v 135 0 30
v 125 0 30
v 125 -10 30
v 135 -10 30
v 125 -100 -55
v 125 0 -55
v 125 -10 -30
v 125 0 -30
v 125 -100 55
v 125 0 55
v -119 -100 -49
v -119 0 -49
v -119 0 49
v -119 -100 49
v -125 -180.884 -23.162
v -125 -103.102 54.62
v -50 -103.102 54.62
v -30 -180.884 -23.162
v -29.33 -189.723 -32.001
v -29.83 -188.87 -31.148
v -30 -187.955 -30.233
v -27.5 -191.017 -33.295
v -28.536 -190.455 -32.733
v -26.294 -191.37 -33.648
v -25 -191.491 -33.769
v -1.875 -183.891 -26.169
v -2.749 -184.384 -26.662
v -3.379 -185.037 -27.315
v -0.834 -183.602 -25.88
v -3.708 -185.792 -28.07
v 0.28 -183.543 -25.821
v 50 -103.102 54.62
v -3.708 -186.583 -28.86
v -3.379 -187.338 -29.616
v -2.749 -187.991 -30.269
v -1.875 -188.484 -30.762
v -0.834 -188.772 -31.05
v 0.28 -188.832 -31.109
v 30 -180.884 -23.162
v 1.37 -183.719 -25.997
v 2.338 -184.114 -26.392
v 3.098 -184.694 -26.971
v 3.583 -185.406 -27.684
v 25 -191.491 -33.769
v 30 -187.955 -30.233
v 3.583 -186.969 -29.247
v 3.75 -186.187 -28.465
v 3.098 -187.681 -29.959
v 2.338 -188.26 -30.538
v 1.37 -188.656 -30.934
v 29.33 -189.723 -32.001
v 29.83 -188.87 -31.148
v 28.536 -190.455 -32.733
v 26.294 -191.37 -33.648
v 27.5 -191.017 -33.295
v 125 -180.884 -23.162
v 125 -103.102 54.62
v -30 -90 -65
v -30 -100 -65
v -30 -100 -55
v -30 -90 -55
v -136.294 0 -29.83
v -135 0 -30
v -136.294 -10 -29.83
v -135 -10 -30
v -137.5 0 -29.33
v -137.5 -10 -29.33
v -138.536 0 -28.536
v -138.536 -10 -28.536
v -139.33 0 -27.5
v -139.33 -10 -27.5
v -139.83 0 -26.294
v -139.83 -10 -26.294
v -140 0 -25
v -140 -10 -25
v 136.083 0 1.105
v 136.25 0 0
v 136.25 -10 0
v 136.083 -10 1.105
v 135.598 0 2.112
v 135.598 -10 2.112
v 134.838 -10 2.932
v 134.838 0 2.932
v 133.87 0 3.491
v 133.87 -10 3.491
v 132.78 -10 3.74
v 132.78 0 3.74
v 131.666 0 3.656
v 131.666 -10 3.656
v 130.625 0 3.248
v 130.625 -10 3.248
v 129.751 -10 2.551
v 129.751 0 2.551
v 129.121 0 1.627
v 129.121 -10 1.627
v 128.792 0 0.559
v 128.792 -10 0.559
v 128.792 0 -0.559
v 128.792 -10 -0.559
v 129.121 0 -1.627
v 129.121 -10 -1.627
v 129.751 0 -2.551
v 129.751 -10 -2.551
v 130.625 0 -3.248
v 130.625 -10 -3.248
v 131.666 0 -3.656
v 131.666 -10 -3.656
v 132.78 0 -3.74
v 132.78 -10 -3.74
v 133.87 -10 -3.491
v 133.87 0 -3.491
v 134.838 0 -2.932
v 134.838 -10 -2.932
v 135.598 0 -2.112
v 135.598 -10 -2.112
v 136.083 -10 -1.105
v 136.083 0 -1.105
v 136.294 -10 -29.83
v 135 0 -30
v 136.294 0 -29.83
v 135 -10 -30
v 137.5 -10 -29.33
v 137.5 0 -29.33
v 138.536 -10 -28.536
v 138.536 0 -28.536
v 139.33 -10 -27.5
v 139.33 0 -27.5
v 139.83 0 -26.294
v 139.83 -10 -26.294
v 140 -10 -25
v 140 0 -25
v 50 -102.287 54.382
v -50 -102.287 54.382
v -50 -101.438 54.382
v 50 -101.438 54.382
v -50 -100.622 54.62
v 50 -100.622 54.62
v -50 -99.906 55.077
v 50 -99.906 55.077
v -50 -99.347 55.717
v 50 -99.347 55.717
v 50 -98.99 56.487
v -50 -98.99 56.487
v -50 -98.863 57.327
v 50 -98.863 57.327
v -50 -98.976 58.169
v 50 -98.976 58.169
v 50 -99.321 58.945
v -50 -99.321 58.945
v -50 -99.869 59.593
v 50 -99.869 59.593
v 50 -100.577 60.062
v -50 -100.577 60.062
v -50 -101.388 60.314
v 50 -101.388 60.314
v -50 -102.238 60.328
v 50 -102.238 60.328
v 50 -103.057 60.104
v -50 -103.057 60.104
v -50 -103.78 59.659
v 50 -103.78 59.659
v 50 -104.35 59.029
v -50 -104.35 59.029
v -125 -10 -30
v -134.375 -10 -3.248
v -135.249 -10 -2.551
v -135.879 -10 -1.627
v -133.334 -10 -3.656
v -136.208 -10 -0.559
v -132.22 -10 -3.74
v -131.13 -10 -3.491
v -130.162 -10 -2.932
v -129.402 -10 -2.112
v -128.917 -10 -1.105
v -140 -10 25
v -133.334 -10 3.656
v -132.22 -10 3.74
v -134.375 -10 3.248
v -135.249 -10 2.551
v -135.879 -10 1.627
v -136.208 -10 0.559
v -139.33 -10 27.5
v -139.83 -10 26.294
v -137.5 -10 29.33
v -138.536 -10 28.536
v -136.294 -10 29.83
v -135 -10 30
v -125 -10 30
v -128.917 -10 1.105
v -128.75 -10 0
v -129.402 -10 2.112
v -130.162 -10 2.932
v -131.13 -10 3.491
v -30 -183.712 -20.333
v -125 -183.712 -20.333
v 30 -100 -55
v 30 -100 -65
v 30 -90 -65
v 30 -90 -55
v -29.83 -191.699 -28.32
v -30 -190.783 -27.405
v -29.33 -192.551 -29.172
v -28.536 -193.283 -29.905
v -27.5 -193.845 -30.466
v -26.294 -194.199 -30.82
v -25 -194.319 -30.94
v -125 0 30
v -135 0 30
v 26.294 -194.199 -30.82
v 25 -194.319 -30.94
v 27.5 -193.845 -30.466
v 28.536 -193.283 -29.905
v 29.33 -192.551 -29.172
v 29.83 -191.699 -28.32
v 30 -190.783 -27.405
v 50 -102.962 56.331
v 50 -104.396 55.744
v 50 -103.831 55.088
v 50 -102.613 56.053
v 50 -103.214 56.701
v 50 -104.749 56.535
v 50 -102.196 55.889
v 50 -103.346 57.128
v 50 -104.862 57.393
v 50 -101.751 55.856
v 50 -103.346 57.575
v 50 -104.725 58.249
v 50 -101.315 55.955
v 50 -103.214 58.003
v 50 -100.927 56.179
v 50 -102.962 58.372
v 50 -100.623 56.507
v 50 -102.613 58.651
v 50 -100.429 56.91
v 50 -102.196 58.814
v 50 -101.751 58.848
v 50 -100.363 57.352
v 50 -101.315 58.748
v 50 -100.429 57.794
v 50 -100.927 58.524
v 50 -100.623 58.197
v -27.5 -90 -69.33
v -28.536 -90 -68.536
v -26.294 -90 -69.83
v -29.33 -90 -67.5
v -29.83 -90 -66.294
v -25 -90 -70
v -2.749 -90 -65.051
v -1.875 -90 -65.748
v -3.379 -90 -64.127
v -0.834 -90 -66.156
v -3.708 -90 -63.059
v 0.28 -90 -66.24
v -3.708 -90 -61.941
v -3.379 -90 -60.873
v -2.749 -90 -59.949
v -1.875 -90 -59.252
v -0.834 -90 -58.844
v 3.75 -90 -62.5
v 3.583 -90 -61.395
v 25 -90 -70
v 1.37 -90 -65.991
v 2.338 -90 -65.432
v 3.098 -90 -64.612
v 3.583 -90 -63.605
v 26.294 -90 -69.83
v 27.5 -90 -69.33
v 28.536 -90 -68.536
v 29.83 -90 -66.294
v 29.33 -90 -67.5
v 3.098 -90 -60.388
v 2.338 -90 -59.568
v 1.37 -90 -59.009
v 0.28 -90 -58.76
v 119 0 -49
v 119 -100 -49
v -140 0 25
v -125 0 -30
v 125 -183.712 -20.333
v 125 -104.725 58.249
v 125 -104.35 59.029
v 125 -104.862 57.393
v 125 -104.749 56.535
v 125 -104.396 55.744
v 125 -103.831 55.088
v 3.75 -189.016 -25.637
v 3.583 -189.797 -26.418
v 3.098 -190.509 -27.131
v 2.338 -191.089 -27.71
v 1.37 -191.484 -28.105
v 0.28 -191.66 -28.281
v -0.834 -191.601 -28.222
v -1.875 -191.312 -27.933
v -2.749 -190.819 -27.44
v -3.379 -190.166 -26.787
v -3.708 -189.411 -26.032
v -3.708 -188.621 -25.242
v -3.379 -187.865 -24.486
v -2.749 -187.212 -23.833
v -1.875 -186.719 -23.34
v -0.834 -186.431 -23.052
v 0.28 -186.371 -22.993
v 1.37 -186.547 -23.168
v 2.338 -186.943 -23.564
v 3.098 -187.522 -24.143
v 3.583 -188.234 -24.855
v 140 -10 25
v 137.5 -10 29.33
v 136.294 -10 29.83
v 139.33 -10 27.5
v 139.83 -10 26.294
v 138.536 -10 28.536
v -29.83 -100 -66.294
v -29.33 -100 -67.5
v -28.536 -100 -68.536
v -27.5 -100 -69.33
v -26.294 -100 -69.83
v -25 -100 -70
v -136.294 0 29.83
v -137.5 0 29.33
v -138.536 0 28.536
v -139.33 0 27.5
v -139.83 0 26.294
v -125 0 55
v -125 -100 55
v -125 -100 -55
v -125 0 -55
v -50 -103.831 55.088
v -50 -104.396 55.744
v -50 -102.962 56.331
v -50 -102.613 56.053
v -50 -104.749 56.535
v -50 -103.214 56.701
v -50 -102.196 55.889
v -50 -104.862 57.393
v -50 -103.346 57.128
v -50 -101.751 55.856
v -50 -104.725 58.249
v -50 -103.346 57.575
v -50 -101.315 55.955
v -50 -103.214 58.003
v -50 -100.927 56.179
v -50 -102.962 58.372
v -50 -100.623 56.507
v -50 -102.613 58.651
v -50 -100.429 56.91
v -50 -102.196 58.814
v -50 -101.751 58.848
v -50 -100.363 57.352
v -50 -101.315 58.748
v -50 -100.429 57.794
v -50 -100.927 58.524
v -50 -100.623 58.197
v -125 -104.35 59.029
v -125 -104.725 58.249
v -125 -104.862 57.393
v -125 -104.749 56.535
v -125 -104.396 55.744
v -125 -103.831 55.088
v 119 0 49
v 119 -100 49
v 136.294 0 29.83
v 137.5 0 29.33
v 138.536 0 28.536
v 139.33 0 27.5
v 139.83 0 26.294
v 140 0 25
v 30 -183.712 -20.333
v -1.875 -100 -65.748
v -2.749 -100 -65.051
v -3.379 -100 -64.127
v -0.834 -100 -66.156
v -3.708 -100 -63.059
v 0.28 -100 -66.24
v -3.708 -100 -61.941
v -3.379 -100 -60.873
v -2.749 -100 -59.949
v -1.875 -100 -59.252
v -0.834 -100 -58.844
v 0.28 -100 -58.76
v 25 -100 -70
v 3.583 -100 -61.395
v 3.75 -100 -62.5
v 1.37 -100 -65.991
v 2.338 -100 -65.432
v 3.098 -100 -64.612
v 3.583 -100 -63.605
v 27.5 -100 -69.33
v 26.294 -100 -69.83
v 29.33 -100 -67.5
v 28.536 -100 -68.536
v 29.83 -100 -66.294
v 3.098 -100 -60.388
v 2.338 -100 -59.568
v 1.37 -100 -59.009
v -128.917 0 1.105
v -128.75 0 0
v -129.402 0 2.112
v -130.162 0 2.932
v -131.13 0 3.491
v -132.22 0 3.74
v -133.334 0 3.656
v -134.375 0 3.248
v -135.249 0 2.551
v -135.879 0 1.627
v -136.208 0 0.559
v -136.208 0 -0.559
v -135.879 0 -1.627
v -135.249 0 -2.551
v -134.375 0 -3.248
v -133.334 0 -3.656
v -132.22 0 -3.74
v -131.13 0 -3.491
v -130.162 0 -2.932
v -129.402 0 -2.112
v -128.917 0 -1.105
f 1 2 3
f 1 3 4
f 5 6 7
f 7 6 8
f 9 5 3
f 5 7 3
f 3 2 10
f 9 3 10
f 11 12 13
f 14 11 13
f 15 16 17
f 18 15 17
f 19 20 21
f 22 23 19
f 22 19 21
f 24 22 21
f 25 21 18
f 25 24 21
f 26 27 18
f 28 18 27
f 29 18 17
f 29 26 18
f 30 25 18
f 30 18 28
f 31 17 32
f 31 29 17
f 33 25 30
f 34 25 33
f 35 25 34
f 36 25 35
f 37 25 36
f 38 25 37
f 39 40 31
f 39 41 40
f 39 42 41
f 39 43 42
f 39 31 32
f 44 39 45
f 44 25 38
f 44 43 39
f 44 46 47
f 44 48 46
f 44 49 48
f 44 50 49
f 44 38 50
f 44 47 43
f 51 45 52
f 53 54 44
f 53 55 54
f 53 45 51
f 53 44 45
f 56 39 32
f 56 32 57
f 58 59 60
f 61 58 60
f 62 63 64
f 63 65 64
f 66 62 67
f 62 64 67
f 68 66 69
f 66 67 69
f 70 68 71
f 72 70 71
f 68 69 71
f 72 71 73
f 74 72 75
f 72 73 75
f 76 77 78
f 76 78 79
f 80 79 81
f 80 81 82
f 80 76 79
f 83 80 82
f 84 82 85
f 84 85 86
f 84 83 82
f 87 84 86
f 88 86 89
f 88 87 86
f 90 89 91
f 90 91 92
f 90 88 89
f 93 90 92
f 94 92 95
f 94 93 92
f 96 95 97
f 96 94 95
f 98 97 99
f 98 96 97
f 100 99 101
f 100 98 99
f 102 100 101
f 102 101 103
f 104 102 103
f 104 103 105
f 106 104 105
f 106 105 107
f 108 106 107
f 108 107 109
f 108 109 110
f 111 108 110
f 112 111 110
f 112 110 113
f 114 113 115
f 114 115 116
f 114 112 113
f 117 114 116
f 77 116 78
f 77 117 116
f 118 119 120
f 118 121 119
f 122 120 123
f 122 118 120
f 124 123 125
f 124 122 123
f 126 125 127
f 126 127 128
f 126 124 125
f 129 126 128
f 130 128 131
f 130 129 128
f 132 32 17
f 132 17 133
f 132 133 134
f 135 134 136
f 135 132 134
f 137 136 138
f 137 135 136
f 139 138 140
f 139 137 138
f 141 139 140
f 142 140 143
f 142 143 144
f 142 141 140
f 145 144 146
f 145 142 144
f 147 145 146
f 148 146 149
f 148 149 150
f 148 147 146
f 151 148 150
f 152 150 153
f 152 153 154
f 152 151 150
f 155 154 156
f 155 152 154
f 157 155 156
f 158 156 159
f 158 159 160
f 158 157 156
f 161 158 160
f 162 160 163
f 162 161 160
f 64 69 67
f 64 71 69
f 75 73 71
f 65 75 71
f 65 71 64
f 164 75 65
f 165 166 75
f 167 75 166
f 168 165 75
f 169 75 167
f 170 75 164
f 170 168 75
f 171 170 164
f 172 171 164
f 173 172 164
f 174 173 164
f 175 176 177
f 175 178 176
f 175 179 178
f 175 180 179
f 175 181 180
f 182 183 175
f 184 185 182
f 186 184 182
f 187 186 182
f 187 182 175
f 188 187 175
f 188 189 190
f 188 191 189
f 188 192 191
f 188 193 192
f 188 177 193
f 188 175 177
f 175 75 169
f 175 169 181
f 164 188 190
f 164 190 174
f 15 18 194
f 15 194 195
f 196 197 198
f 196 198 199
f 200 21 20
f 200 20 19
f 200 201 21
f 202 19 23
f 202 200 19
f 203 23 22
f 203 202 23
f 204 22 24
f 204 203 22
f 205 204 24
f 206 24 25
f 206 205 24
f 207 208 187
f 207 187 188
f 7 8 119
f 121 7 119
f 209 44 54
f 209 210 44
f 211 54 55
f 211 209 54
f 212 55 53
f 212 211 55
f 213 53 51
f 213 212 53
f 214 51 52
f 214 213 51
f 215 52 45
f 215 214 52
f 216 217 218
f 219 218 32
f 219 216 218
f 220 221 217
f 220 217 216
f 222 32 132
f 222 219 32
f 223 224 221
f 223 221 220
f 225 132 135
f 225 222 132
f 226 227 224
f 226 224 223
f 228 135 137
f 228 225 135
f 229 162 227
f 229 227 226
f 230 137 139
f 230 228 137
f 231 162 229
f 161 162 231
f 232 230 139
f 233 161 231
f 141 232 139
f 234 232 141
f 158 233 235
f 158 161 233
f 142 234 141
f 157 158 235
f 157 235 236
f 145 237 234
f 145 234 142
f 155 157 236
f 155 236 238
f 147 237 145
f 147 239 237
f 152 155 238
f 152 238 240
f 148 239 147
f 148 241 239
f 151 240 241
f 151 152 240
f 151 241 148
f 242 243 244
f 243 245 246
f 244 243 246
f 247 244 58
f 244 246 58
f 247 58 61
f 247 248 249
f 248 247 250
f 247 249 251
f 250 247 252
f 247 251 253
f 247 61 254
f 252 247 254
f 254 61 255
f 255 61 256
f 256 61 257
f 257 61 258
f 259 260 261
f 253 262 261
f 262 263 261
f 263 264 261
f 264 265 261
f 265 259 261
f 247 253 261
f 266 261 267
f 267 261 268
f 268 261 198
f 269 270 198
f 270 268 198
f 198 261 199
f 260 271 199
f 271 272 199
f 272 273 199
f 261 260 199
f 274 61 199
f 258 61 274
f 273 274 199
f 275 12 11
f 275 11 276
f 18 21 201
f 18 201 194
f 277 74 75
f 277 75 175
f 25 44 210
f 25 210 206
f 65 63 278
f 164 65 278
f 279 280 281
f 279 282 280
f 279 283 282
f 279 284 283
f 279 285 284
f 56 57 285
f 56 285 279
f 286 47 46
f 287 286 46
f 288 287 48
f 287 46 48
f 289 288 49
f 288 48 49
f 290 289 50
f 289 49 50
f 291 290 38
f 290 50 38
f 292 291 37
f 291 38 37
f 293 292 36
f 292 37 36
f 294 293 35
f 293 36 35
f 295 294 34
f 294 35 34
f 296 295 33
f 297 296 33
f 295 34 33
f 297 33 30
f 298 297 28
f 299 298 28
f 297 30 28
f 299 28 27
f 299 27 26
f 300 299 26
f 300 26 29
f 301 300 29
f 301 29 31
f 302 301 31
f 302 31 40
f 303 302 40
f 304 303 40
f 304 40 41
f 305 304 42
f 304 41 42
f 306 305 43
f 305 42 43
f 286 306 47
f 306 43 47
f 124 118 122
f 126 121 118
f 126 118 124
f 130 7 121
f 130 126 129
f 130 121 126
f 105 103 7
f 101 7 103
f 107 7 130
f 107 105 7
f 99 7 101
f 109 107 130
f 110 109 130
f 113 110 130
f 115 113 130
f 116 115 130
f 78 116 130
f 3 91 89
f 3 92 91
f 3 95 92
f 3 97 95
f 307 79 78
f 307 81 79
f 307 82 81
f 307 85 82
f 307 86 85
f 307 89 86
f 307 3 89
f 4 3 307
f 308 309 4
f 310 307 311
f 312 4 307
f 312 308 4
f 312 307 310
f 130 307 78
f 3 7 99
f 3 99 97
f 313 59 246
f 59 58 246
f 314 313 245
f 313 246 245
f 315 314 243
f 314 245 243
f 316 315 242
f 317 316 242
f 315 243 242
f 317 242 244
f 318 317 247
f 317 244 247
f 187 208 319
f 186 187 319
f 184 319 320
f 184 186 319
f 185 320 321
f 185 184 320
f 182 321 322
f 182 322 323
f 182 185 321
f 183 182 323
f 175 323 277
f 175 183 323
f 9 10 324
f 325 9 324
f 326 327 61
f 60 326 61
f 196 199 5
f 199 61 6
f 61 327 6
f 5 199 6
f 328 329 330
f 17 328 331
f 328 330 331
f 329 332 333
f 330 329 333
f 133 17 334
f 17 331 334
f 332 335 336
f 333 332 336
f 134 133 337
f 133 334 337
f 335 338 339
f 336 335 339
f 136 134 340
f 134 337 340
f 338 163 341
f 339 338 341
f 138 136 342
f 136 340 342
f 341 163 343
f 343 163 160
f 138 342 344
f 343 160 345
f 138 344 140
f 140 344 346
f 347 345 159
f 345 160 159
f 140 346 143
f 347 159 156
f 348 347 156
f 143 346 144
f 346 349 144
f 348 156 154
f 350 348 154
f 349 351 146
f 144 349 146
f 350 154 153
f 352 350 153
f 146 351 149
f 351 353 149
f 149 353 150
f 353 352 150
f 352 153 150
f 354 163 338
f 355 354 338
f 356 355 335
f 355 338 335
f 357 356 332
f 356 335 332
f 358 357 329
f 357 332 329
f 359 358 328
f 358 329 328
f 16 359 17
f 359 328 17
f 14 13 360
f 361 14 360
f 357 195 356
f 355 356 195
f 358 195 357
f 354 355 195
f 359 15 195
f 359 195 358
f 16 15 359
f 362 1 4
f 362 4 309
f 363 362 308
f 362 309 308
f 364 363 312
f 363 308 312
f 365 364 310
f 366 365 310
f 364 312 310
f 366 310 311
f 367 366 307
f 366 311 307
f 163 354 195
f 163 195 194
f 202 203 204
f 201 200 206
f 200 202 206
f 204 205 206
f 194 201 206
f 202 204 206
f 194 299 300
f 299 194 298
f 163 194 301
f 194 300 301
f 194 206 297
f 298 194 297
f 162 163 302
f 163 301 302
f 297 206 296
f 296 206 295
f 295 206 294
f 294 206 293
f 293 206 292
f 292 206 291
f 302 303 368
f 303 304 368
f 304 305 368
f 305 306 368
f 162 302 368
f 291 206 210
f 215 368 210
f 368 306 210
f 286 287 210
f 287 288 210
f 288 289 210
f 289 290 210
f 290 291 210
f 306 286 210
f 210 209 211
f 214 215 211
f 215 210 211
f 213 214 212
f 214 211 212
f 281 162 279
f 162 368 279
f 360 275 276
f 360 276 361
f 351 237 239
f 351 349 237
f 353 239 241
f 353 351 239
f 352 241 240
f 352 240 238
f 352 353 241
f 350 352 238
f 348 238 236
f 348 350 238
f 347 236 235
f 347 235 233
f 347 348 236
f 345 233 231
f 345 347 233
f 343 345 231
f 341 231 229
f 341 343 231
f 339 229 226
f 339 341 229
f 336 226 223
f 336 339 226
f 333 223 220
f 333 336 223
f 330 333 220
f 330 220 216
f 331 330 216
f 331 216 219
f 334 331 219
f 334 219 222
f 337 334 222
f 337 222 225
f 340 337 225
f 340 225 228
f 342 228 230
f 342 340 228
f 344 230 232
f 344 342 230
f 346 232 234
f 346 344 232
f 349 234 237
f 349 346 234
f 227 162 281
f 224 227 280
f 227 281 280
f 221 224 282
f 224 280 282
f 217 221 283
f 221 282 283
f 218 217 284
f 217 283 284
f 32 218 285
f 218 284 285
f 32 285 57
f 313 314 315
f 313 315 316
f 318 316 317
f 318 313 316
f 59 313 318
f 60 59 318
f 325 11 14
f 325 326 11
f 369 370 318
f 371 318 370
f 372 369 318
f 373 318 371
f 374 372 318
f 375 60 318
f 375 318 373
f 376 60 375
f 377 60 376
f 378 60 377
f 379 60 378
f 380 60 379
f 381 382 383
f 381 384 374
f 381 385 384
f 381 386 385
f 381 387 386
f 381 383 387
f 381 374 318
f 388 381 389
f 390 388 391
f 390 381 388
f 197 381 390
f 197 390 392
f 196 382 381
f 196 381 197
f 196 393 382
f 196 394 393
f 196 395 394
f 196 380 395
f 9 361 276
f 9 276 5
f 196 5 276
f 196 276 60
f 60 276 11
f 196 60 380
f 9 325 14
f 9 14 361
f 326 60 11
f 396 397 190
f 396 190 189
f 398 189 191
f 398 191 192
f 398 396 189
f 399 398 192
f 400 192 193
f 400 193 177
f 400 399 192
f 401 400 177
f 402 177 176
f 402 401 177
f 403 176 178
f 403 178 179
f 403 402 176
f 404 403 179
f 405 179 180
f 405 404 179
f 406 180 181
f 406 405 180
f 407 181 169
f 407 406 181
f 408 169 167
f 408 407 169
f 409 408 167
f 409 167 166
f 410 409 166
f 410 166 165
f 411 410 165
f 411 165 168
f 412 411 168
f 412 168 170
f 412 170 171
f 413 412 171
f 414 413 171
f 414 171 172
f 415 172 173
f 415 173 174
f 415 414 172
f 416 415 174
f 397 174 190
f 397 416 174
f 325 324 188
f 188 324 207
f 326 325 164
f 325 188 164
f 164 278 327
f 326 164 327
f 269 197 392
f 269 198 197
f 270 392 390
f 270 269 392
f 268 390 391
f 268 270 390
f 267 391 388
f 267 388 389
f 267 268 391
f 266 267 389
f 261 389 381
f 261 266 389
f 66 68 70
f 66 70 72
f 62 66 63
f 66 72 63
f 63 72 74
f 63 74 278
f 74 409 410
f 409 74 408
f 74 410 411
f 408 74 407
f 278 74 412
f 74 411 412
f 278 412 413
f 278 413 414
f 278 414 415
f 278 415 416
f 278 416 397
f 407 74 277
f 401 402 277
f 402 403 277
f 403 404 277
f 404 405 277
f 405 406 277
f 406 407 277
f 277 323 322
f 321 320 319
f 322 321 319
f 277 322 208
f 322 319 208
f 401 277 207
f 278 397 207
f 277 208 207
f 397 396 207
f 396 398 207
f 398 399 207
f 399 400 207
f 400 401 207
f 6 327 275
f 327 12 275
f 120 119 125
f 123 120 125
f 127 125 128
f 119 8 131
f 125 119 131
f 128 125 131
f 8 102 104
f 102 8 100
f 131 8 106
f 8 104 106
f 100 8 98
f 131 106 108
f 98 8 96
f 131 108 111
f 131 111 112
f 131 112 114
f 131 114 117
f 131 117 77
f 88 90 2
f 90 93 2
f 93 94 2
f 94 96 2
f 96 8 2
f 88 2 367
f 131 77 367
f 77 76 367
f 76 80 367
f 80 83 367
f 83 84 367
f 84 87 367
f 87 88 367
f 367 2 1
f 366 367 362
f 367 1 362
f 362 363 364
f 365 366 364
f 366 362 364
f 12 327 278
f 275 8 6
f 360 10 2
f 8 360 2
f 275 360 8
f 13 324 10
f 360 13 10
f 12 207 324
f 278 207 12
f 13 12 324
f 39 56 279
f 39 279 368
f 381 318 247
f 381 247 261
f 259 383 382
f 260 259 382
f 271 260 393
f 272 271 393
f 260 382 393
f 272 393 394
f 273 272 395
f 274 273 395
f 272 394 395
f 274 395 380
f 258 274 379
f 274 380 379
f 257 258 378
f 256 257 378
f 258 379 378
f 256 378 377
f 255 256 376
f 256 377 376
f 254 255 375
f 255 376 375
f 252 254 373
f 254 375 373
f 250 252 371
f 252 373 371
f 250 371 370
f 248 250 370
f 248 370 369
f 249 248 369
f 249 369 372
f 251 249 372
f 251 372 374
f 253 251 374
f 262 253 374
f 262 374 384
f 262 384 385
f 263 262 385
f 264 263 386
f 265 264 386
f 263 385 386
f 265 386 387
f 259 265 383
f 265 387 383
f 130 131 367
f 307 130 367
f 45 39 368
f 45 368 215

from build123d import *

# Parameters (mm, degrees)
F0_W           = 238
F0_H           = 98
F1_DEPTH       = 100
F0_W_2         = 15
F0_H_2         = 60
F0_R           = 3.75
F2_DEPTH       = 10
F3_R           = 5
F4_W           = 60
F4_H           = 15
F4_R           = 3.75
F5_DEPTH       = 10
F6_R           = 5
F7_R           = 3
F7_R_2         = 1.5
F8_DEPTH       = 50
F11_END_RADIUS = 3
F10_W          = 250
F10_H          = 4
F11_REACH      = 402.309667303
F12_R          = 3.75
F13_DEPTH      = 4
F14_R          = 5


with BuildPart() as f1:
    # F0 (on Front) → F1 (new body)
    with BuildSketch(Plane.XZ):
        Polygon((125, 55), (-125, 55), (-125, 30), (-125, -30), (-125, -55), (125, -55), (125, -30), (125, 30), align=None)
        Rectangle(F0_W, F0_H, mode=Mode.SUBTRACT)
    extrude(amount=F1_DEPTH)

    # F0 (on Front) → F2 (join)
    with BuildSketch(Plane.XZ):
        with Locations((132.5, 0)):
            Rectangle(F0_W_2, F0_H_2)
        with Locations((132.5, 0)):
            Circle(F0_R, mode=Mode.SUBTRACT)
        with Locations((-132.5, 0)):
            Rectangle(F0_W_2, F0_H_2)
        with Locations((-132.5, 0)):
            Circle(F0_R, mode=Mode.SUBTRACT)
    extrude(amount=F2_DEPTH)

    # F3
    f3_edges = [f1.edges().sort_by_distance(p)[0] for p in [
        (140, -5, 30),
        (140, -5, -30),
        (-140, -5, -30),
        (-140, -5, 30),
    ]]
    fillet(f3_edges, radius=F3_R)

    # F4 (on face) → F5 (join)
    with BuildSketch(Plane.XZ.offset(100)):
        with Locations((0, -62.5)):
            Rectangle(F4_W, F4_H)
        with Locations((0, -62.5)):
            Circle(F4_R, mode=Mode.SUBTRACT)
    extrude(amount=-F5_DEPTH)

    # F6
    f6_edges = [f1.edges().sort_by_distance(p)[0] for p in [
        (-30, -95, -70),
        (30, -95, -70),
    ]]
    fillet(f6_edges, radius=F6_R)


with BuildPart() as f8:
    # F7 (on Right) → F8 (new body, symmetric)
    with BuildSketch(Plane.YZ):
        with Locations((-101.8626221217, 57.3517310288)):
            Circle(F7_R)
        with Locations((-101.8626221217, 57.3517310288)):
            Circle(F7_R_2, mode=Mode.SUBTRACT)
    extrude(amount=F8_DEPTH, both=True)

    f11_end = (Plane(origin=(0, -101.8626221217, 57.3517310288), x_dir=(0, 0, 1), z_dir=(1, 0, 0)) * Cylinder(F11_END_RADIUS, 1456.9620154124, mode=Mode.PRIVATE)).faces().sort_by_distance((0, -104.8626221217, 57.3517310288))[0]
    # F10 (on face) → F11 (join, up to the whole of a round face its end follows)
    with BuildSketch(Plane(origin=(0, -77.5, -77.5), x_dir=(-1, 0, 0), z_dir=(0, 0.7071067812, 0.7071067812))):
        with Locations((0, 113.5263462286)):
            Rectangle(F10_W, F10_H)
    f11_long = extrude(amount=F11_REACH, mode=Mode.PRIVATE)
    add(split(f11_long, bisect_by=f11_end, keep=Keep.ALL, mode=Mode.PRIVATE).solids().sort_by_distance((0, -157.7752492616, 2.7752492616))[0])

    # F12 (on face) → F13 (join)
    with BuildSketch(Plane(origin=(0, -78.8610356992, 78.8610356992), x_dir=(1, 0, 0), z_dir=(0, 0.7071067812, -0.7071067812))):
        Polygon((-125, 109.6015510839), (125, 109.6015510839), (125, 144.2822510839), (30, 144.2822510839), (30, 159.2822510839), (-30, 159.2822510839), (-30, 144.2822510839), (-125, 144.2822510839), align=None)
        with Locations((0, 151.7822510839)):
            Circle(F12_R, mode=Mode.SUBTRACT)
    extrude(amount=-F13_DEPTH)

    # F14
    f14_edges = [f8.edges().sort_by_distance(p)[0] for p in [
        (30, -192.904809, -32.354311),
        (-30, -192.904809, -32.354311),
    ]]
    fillet(f14_edges, radius=F14_R)


with BuildPart() as f8_1:
    # F15: moved
    add(f8.part)


solid = Compound([f1.part, f8_1.part])
